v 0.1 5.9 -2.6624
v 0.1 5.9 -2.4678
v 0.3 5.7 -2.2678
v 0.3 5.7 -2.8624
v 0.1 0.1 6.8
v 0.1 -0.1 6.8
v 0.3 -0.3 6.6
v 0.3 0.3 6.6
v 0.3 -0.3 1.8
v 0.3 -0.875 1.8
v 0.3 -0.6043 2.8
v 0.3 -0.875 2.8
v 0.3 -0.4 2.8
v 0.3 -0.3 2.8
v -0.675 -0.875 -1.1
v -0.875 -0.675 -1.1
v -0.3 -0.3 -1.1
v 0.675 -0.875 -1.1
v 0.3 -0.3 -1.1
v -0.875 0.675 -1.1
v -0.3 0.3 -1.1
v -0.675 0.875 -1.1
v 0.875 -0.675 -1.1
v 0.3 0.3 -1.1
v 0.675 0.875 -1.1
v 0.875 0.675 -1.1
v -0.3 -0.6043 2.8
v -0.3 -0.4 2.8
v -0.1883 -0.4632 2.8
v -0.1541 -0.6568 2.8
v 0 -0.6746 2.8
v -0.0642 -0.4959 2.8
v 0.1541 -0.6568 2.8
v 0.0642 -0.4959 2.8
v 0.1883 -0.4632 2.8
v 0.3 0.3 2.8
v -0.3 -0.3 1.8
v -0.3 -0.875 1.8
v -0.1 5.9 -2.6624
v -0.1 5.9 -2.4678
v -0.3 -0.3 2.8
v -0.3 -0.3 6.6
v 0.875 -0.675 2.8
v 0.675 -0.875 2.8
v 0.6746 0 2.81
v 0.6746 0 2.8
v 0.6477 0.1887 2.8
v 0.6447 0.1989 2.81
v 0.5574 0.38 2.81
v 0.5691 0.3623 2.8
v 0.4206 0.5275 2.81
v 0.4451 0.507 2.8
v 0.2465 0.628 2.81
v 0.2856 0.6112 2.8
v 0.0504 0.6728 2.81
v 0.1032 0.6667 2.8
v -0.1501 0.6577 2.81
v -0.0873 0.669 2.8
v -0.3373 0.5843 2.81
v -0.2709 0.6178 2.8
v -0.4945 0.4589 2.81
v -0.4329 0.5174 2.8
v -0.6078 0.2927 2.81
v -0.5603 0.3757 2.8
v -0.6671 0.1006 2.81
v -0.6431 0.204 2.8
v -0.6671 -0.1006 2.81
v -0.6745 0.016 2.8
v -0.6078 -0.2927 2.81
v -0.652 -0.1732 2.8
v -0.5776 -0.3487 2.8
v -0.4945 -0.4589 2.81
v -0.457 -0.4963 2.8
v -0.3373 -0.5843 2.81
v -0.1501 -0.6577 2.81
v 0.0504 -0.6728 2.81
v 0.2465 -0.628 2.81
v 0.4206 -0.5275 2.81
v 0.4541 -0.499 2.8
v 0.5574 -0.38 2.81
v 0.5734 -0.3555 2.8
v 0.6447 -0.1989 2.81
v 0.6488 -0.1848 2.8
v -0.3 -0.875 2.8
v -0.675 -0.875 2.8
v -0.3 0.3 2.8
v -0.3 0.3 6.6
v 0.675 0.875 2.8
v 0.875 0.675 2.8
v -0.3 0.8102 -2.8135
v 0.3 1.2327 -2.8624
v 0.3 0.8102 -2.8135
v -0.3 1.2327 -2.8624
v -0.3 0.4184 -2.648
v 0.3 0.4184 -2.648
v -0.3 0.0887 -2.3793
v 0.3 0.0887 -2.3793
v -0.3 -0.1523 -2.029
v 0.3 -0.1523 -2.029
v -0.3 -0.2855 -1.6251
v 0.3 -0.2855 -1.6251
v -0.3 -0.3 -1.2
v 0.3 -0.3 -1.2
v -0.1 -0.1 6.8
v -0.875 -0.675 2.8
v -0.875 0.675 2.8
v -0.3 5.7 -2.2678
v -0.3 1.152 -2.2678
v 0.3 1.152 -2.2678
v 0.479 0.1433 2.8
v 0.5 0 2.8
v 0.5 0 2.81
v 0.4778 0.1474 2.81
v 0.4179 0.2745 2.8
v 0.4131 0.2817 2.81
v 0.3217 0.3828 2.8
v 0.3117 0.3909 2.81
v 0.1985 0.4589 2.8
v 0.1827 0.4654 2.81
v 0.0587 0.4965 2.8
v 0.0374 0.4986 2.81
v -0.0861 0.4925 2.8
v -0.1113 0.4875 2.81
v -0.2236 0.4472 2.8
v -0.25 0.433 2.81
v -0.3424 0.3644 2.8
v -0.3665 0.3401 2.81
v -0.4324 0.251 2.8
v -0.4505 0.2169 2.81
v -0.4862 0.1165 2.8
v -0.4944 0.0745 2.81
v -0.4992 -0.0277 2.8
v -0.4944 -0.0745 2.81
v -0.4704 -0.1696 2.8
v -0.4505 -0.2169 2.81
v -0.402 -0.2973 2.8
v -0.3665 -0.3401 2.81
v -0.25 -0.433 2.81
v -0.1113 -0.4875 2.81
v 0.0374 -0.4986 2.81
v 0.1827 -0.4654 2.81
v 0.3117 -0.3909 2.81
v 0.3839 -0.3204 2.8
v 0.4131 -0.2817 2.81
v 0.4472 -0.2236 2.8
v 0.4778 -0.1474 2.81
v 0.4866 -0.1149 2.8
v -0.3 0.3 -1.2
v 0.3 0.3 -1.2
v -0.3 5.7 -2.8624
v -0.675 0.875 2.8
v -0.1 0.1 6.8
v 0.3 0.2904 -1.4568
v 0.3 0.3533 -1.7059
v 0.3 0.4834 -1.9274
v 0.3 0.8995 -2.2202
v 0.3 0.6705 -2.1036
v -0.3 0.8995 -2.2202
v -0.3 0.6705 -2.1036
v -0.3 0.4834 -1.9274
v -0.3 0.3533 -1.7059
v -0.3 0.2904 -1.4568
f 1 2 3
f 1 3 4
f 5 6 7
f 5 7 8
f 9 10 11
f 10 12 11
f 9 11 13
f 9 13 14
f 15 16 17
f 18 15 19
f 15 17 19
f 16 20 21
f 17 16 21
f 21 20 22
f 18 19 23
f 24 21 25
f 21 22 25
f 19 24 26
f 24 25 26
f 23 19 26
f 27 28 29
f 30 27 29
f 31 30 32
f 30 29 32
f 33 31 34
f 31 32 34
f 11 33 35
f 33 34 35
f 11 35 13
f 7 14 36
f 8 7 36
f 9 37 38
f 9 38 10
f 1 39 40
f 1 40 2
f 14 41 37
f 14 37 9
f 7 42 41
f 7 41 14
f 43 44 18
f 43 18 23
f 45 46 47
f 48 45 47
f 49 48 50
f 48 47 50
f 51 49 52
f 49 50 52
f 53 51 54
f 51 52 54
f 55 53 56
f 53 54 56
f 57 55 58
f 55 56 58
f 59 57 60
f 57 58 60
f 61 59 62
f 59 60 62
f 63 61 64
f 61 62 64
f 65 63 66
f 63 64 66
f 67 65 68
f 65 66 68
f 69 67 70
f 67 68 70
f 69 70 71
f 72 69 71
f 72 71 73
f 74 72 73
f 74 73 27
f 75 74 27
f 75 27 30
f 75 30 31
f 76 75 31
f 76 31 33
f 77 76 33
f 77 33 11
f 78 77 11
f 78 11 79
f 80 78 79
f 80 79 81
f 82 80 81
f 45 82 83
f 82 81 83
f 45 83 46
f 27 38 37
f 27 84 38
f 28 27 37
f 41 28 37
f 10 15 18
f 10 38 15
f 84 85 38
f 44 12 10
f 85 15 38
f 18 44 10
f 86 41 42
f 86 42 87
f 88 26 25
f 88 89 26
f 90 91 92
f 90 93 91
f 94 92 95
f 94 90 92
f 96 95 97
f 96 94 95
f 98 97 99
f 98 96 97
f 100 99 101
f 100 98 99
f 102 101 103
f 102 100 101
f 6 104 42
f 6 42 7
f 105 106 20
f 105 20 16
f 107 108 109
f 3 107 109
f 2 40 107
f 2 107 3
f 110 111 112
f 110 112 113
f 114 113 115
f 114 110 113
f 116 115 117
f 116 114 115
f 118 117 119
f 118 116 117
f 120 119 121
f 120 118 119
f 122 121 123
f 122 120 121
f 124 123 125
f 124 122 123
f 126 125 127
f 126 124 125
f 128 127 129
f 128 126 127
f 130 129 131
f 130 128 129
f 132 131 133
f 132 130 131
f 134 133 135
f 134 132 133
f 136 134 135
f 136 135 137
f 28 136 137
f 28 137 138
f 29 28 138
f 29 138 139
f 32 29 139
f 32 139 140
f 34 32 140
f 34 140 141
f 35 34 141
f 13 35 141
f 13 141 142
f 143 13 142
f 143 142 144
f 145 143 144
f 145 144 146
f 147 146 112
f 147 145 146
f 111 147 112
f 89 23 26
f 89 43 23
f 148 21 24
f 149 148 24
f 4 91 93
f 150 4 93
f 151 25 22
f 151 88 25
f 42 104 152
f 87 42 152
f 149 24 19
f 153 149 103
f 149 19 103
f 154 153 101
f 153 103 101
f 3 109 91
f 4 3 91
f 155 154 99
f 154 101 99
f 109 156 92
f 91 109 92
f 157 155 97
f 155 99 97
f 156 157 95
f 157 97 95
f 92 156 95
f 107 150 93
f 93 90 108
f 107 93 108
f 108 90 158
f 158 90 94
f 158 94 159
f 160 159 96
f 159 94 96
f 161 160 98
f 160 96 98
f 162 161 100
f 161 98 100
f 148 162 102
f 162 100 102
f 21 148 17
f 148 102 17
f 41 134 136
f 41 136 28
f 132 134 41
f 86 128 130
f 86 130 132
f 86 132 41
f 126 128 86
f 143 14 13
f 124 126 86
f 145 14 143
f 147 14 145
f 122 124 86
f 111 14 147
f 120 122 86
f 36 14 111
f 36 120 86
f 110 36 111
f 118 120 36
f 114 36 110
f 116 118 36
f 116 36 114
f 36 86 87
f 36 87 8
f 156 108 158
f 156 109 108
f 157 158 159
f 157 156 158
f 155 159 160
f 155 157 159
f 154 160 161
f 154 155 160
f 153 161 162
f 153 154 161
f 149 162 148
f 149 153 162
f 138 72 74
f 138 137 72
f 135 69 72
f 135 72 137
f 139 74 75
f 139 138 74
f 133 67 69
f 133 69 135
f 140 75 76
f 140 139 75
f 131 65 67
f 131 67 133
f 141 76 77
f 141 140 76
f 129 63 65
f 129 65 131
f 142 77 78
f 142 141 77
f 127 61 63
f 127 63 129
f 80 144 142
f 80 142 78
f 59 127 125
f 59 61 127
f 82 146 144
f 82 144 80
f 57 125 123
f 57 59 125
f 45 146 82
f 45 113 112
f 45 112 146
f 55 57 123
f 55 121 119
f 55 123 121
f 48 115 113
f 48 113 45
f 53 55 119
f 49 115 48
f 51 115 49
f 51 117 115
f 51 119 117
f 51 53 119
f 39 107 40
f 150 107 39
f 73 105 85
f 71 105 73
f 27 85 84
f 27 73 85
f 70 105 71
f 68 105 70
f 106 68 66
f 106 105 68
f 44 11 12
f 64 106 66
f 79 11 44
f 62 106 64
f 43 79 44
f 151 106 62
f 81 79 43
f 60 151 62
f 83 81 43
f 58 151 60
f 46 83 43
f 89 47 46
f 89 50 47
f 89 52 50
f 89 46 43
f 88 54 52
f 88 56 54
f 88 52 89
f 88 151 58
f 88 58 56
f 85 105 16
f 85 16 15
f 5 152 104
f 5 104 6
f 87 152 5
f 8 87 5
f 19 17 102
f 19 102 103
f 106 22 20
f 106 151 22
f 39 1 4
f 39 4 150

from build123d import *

# Parameters (mm, degrees)
BOSS_EXTRU_1_DEPTH           = 2.8
BOSS_EXTRU_1_DEPTH_BACK      = 1.1
ESQUISSE1_W                  = 0.6
ESQUISSE1_H                  = 0.6
ESQUISSE2_W                  = 0.6
ESQUISSE2_H                  = 0.575
ENL_V_MAT_EXTRU_1_DEPTH      = 1
BOSS_EXTRU_2_DEPTH           = 4
BOSS_EXTRU_2_DEPTH_BACK      = 4
ESQUISSE3_W                  = 0.6
ESQUISSE3_H                  = 0.6
ESQUISSE4_R                  = 0.674645205
ESQUISSE4_R_2                = 0.5
BOSS_EXTRU_3_DEPTH           = 0.01
ESQUISSE6_W                  = 0.6
ESQUISSE6_H                  = 0.6
ENL_V_MAT_EXTRU_2_DEPTH      = 0.1
ENL_V_MAT_EXTRU_2_DEPTH_BACK = 0.1
ESQUISSE5_W                  = 0.6
ESQUISSE5_H                  = 0.6
CHANFREIN1_SIZE              = 0.2


with BuildPart() as part:
    # Esquisse1 → Boss.-Extru.1 (new, two sides: drawn at the far end of the back side and taken through both)
    with BuildSketch(Plane.XY.offset(-BOSS_EXTRU_1_DEPTH_BACK)):
        Polygon((-0.675, 0.875), (-0.875, 0.675), (-0.875, -0.675), (-0.675, -0.875), (0.675, -0.875), (0.875, -0.675), (0.875, 0.675), (0.675, 0.875), align=None)
        Rectangle(ESQUISSE1_W, ESQUISSE1_H, mode=Mode.SUBTRACT)
    extrude(amount=BOSS_EXTRU_1_DEPTH + BOSS_EXTRU_1_DEPTH_BACK)

    # Esquisse2 → Enlèv. mat.-Extru.1 (cut)
    with BuildSketch(Plane.XY.offset(2.8)):
        with Locations((0, -0.5875)):
            Rectangle(ESQUISSE2_W, ESQUISSE2_H)
    extrude(amount=-ENL_V_MAT_EXTRU_1_DEPTH, mode=Mode.SUBTRACT)

    # Esquisse3 → Boss.-Extru.2 (add, two sides: drawn at the far end of the back side and taken through both)
    with BuildSketch(Plane.XY.offset(2.8).offset(-BOSS_EXTRU_2_DEPTH_BACK)):
        Rectangle(ESQUISSE3_W, ESQUISSE3_H)
    extrude(amount=BOSS_EXTRU_2_DEPTH + BOSS_EXTRU_2_DEPTH_BACK)

    # Esquisse4 → Boss.-Extru.3 (add)
    with BuildSketch(Plane.XY.offset(2.8)):
        Circle(ESQUISSE4_R)
        Circle(ESQUISSE4_R_2, mode=Mode.SUBTRACT)
    extrude(amount=BOSS_EXTRU_3_DEPTH)

    # Balayage1: sweep along a path in Esquisse25
    with BuildLine(Plane(origin=(0, 0, 0), x_dir=(0, 0, -1), z_dir=(1, 0, 0))) as balayage1_path:
        Line((2.565105715, 6), (2.565105715, 1.192347565))
        ThreePointArc((2.565105715, 1.192347565), (2.153394049, 0.286090658), (1.2, 0))
    # Esquisse6 → Balayage1 (sweep)
    with BuildSketch(Plane(origin=(0, 0, -1.2), x_dir=(-1, 0, 0), z_dir=(0, 0, -1))):
        Rectangle(ESQUISSE6_W, ESQUISSE6_H)
    sweep(path=balayage1_path.line)

    # Esquisse5 → Enlèv. mat.-Extru.2 (cut, two sides: drawn at the far end of the back side and taken through both)
    with BuildSketch(Plane(origin=(0, 6, 0), x_dir=(1, 0, 0), z_dir=(0, 1, 0)).offset(-ENL_V_MAT_EXTRU_2_DEPTH_BACK)):
        with Locations((0, 2.565105715)):
            Rectangle(ESQUISSE5_W, ESQUISSE5_H)
    extrude(amount=ENL_V_MAT_EXTRU_2_DEPTH + ENL_V_MAT_EXTRU_2_DEPTH_BACK, mode=Mode.SUBTRACT)

    # Chanfrein1
    chanfrein1_edges = [part.edges().sort_by_distance(p)[0] for p in [
        (0, -0.3, 6.8),
        (-0.3, 0, 6.8),
        (0, 0.3, 6.8),
        (0.3, 0, 6.8),
        (0, 5.9, -2.267831149),
        (-0.3, 5.9, -2.565105715),
        (0, 5.9, -2.862380281),
        (0.3, 5.9, -2.565105715),
    ]]
    chamfer(chanfrein1_edges, length=CHANFREIN1_SIZE)


solid = part.part
